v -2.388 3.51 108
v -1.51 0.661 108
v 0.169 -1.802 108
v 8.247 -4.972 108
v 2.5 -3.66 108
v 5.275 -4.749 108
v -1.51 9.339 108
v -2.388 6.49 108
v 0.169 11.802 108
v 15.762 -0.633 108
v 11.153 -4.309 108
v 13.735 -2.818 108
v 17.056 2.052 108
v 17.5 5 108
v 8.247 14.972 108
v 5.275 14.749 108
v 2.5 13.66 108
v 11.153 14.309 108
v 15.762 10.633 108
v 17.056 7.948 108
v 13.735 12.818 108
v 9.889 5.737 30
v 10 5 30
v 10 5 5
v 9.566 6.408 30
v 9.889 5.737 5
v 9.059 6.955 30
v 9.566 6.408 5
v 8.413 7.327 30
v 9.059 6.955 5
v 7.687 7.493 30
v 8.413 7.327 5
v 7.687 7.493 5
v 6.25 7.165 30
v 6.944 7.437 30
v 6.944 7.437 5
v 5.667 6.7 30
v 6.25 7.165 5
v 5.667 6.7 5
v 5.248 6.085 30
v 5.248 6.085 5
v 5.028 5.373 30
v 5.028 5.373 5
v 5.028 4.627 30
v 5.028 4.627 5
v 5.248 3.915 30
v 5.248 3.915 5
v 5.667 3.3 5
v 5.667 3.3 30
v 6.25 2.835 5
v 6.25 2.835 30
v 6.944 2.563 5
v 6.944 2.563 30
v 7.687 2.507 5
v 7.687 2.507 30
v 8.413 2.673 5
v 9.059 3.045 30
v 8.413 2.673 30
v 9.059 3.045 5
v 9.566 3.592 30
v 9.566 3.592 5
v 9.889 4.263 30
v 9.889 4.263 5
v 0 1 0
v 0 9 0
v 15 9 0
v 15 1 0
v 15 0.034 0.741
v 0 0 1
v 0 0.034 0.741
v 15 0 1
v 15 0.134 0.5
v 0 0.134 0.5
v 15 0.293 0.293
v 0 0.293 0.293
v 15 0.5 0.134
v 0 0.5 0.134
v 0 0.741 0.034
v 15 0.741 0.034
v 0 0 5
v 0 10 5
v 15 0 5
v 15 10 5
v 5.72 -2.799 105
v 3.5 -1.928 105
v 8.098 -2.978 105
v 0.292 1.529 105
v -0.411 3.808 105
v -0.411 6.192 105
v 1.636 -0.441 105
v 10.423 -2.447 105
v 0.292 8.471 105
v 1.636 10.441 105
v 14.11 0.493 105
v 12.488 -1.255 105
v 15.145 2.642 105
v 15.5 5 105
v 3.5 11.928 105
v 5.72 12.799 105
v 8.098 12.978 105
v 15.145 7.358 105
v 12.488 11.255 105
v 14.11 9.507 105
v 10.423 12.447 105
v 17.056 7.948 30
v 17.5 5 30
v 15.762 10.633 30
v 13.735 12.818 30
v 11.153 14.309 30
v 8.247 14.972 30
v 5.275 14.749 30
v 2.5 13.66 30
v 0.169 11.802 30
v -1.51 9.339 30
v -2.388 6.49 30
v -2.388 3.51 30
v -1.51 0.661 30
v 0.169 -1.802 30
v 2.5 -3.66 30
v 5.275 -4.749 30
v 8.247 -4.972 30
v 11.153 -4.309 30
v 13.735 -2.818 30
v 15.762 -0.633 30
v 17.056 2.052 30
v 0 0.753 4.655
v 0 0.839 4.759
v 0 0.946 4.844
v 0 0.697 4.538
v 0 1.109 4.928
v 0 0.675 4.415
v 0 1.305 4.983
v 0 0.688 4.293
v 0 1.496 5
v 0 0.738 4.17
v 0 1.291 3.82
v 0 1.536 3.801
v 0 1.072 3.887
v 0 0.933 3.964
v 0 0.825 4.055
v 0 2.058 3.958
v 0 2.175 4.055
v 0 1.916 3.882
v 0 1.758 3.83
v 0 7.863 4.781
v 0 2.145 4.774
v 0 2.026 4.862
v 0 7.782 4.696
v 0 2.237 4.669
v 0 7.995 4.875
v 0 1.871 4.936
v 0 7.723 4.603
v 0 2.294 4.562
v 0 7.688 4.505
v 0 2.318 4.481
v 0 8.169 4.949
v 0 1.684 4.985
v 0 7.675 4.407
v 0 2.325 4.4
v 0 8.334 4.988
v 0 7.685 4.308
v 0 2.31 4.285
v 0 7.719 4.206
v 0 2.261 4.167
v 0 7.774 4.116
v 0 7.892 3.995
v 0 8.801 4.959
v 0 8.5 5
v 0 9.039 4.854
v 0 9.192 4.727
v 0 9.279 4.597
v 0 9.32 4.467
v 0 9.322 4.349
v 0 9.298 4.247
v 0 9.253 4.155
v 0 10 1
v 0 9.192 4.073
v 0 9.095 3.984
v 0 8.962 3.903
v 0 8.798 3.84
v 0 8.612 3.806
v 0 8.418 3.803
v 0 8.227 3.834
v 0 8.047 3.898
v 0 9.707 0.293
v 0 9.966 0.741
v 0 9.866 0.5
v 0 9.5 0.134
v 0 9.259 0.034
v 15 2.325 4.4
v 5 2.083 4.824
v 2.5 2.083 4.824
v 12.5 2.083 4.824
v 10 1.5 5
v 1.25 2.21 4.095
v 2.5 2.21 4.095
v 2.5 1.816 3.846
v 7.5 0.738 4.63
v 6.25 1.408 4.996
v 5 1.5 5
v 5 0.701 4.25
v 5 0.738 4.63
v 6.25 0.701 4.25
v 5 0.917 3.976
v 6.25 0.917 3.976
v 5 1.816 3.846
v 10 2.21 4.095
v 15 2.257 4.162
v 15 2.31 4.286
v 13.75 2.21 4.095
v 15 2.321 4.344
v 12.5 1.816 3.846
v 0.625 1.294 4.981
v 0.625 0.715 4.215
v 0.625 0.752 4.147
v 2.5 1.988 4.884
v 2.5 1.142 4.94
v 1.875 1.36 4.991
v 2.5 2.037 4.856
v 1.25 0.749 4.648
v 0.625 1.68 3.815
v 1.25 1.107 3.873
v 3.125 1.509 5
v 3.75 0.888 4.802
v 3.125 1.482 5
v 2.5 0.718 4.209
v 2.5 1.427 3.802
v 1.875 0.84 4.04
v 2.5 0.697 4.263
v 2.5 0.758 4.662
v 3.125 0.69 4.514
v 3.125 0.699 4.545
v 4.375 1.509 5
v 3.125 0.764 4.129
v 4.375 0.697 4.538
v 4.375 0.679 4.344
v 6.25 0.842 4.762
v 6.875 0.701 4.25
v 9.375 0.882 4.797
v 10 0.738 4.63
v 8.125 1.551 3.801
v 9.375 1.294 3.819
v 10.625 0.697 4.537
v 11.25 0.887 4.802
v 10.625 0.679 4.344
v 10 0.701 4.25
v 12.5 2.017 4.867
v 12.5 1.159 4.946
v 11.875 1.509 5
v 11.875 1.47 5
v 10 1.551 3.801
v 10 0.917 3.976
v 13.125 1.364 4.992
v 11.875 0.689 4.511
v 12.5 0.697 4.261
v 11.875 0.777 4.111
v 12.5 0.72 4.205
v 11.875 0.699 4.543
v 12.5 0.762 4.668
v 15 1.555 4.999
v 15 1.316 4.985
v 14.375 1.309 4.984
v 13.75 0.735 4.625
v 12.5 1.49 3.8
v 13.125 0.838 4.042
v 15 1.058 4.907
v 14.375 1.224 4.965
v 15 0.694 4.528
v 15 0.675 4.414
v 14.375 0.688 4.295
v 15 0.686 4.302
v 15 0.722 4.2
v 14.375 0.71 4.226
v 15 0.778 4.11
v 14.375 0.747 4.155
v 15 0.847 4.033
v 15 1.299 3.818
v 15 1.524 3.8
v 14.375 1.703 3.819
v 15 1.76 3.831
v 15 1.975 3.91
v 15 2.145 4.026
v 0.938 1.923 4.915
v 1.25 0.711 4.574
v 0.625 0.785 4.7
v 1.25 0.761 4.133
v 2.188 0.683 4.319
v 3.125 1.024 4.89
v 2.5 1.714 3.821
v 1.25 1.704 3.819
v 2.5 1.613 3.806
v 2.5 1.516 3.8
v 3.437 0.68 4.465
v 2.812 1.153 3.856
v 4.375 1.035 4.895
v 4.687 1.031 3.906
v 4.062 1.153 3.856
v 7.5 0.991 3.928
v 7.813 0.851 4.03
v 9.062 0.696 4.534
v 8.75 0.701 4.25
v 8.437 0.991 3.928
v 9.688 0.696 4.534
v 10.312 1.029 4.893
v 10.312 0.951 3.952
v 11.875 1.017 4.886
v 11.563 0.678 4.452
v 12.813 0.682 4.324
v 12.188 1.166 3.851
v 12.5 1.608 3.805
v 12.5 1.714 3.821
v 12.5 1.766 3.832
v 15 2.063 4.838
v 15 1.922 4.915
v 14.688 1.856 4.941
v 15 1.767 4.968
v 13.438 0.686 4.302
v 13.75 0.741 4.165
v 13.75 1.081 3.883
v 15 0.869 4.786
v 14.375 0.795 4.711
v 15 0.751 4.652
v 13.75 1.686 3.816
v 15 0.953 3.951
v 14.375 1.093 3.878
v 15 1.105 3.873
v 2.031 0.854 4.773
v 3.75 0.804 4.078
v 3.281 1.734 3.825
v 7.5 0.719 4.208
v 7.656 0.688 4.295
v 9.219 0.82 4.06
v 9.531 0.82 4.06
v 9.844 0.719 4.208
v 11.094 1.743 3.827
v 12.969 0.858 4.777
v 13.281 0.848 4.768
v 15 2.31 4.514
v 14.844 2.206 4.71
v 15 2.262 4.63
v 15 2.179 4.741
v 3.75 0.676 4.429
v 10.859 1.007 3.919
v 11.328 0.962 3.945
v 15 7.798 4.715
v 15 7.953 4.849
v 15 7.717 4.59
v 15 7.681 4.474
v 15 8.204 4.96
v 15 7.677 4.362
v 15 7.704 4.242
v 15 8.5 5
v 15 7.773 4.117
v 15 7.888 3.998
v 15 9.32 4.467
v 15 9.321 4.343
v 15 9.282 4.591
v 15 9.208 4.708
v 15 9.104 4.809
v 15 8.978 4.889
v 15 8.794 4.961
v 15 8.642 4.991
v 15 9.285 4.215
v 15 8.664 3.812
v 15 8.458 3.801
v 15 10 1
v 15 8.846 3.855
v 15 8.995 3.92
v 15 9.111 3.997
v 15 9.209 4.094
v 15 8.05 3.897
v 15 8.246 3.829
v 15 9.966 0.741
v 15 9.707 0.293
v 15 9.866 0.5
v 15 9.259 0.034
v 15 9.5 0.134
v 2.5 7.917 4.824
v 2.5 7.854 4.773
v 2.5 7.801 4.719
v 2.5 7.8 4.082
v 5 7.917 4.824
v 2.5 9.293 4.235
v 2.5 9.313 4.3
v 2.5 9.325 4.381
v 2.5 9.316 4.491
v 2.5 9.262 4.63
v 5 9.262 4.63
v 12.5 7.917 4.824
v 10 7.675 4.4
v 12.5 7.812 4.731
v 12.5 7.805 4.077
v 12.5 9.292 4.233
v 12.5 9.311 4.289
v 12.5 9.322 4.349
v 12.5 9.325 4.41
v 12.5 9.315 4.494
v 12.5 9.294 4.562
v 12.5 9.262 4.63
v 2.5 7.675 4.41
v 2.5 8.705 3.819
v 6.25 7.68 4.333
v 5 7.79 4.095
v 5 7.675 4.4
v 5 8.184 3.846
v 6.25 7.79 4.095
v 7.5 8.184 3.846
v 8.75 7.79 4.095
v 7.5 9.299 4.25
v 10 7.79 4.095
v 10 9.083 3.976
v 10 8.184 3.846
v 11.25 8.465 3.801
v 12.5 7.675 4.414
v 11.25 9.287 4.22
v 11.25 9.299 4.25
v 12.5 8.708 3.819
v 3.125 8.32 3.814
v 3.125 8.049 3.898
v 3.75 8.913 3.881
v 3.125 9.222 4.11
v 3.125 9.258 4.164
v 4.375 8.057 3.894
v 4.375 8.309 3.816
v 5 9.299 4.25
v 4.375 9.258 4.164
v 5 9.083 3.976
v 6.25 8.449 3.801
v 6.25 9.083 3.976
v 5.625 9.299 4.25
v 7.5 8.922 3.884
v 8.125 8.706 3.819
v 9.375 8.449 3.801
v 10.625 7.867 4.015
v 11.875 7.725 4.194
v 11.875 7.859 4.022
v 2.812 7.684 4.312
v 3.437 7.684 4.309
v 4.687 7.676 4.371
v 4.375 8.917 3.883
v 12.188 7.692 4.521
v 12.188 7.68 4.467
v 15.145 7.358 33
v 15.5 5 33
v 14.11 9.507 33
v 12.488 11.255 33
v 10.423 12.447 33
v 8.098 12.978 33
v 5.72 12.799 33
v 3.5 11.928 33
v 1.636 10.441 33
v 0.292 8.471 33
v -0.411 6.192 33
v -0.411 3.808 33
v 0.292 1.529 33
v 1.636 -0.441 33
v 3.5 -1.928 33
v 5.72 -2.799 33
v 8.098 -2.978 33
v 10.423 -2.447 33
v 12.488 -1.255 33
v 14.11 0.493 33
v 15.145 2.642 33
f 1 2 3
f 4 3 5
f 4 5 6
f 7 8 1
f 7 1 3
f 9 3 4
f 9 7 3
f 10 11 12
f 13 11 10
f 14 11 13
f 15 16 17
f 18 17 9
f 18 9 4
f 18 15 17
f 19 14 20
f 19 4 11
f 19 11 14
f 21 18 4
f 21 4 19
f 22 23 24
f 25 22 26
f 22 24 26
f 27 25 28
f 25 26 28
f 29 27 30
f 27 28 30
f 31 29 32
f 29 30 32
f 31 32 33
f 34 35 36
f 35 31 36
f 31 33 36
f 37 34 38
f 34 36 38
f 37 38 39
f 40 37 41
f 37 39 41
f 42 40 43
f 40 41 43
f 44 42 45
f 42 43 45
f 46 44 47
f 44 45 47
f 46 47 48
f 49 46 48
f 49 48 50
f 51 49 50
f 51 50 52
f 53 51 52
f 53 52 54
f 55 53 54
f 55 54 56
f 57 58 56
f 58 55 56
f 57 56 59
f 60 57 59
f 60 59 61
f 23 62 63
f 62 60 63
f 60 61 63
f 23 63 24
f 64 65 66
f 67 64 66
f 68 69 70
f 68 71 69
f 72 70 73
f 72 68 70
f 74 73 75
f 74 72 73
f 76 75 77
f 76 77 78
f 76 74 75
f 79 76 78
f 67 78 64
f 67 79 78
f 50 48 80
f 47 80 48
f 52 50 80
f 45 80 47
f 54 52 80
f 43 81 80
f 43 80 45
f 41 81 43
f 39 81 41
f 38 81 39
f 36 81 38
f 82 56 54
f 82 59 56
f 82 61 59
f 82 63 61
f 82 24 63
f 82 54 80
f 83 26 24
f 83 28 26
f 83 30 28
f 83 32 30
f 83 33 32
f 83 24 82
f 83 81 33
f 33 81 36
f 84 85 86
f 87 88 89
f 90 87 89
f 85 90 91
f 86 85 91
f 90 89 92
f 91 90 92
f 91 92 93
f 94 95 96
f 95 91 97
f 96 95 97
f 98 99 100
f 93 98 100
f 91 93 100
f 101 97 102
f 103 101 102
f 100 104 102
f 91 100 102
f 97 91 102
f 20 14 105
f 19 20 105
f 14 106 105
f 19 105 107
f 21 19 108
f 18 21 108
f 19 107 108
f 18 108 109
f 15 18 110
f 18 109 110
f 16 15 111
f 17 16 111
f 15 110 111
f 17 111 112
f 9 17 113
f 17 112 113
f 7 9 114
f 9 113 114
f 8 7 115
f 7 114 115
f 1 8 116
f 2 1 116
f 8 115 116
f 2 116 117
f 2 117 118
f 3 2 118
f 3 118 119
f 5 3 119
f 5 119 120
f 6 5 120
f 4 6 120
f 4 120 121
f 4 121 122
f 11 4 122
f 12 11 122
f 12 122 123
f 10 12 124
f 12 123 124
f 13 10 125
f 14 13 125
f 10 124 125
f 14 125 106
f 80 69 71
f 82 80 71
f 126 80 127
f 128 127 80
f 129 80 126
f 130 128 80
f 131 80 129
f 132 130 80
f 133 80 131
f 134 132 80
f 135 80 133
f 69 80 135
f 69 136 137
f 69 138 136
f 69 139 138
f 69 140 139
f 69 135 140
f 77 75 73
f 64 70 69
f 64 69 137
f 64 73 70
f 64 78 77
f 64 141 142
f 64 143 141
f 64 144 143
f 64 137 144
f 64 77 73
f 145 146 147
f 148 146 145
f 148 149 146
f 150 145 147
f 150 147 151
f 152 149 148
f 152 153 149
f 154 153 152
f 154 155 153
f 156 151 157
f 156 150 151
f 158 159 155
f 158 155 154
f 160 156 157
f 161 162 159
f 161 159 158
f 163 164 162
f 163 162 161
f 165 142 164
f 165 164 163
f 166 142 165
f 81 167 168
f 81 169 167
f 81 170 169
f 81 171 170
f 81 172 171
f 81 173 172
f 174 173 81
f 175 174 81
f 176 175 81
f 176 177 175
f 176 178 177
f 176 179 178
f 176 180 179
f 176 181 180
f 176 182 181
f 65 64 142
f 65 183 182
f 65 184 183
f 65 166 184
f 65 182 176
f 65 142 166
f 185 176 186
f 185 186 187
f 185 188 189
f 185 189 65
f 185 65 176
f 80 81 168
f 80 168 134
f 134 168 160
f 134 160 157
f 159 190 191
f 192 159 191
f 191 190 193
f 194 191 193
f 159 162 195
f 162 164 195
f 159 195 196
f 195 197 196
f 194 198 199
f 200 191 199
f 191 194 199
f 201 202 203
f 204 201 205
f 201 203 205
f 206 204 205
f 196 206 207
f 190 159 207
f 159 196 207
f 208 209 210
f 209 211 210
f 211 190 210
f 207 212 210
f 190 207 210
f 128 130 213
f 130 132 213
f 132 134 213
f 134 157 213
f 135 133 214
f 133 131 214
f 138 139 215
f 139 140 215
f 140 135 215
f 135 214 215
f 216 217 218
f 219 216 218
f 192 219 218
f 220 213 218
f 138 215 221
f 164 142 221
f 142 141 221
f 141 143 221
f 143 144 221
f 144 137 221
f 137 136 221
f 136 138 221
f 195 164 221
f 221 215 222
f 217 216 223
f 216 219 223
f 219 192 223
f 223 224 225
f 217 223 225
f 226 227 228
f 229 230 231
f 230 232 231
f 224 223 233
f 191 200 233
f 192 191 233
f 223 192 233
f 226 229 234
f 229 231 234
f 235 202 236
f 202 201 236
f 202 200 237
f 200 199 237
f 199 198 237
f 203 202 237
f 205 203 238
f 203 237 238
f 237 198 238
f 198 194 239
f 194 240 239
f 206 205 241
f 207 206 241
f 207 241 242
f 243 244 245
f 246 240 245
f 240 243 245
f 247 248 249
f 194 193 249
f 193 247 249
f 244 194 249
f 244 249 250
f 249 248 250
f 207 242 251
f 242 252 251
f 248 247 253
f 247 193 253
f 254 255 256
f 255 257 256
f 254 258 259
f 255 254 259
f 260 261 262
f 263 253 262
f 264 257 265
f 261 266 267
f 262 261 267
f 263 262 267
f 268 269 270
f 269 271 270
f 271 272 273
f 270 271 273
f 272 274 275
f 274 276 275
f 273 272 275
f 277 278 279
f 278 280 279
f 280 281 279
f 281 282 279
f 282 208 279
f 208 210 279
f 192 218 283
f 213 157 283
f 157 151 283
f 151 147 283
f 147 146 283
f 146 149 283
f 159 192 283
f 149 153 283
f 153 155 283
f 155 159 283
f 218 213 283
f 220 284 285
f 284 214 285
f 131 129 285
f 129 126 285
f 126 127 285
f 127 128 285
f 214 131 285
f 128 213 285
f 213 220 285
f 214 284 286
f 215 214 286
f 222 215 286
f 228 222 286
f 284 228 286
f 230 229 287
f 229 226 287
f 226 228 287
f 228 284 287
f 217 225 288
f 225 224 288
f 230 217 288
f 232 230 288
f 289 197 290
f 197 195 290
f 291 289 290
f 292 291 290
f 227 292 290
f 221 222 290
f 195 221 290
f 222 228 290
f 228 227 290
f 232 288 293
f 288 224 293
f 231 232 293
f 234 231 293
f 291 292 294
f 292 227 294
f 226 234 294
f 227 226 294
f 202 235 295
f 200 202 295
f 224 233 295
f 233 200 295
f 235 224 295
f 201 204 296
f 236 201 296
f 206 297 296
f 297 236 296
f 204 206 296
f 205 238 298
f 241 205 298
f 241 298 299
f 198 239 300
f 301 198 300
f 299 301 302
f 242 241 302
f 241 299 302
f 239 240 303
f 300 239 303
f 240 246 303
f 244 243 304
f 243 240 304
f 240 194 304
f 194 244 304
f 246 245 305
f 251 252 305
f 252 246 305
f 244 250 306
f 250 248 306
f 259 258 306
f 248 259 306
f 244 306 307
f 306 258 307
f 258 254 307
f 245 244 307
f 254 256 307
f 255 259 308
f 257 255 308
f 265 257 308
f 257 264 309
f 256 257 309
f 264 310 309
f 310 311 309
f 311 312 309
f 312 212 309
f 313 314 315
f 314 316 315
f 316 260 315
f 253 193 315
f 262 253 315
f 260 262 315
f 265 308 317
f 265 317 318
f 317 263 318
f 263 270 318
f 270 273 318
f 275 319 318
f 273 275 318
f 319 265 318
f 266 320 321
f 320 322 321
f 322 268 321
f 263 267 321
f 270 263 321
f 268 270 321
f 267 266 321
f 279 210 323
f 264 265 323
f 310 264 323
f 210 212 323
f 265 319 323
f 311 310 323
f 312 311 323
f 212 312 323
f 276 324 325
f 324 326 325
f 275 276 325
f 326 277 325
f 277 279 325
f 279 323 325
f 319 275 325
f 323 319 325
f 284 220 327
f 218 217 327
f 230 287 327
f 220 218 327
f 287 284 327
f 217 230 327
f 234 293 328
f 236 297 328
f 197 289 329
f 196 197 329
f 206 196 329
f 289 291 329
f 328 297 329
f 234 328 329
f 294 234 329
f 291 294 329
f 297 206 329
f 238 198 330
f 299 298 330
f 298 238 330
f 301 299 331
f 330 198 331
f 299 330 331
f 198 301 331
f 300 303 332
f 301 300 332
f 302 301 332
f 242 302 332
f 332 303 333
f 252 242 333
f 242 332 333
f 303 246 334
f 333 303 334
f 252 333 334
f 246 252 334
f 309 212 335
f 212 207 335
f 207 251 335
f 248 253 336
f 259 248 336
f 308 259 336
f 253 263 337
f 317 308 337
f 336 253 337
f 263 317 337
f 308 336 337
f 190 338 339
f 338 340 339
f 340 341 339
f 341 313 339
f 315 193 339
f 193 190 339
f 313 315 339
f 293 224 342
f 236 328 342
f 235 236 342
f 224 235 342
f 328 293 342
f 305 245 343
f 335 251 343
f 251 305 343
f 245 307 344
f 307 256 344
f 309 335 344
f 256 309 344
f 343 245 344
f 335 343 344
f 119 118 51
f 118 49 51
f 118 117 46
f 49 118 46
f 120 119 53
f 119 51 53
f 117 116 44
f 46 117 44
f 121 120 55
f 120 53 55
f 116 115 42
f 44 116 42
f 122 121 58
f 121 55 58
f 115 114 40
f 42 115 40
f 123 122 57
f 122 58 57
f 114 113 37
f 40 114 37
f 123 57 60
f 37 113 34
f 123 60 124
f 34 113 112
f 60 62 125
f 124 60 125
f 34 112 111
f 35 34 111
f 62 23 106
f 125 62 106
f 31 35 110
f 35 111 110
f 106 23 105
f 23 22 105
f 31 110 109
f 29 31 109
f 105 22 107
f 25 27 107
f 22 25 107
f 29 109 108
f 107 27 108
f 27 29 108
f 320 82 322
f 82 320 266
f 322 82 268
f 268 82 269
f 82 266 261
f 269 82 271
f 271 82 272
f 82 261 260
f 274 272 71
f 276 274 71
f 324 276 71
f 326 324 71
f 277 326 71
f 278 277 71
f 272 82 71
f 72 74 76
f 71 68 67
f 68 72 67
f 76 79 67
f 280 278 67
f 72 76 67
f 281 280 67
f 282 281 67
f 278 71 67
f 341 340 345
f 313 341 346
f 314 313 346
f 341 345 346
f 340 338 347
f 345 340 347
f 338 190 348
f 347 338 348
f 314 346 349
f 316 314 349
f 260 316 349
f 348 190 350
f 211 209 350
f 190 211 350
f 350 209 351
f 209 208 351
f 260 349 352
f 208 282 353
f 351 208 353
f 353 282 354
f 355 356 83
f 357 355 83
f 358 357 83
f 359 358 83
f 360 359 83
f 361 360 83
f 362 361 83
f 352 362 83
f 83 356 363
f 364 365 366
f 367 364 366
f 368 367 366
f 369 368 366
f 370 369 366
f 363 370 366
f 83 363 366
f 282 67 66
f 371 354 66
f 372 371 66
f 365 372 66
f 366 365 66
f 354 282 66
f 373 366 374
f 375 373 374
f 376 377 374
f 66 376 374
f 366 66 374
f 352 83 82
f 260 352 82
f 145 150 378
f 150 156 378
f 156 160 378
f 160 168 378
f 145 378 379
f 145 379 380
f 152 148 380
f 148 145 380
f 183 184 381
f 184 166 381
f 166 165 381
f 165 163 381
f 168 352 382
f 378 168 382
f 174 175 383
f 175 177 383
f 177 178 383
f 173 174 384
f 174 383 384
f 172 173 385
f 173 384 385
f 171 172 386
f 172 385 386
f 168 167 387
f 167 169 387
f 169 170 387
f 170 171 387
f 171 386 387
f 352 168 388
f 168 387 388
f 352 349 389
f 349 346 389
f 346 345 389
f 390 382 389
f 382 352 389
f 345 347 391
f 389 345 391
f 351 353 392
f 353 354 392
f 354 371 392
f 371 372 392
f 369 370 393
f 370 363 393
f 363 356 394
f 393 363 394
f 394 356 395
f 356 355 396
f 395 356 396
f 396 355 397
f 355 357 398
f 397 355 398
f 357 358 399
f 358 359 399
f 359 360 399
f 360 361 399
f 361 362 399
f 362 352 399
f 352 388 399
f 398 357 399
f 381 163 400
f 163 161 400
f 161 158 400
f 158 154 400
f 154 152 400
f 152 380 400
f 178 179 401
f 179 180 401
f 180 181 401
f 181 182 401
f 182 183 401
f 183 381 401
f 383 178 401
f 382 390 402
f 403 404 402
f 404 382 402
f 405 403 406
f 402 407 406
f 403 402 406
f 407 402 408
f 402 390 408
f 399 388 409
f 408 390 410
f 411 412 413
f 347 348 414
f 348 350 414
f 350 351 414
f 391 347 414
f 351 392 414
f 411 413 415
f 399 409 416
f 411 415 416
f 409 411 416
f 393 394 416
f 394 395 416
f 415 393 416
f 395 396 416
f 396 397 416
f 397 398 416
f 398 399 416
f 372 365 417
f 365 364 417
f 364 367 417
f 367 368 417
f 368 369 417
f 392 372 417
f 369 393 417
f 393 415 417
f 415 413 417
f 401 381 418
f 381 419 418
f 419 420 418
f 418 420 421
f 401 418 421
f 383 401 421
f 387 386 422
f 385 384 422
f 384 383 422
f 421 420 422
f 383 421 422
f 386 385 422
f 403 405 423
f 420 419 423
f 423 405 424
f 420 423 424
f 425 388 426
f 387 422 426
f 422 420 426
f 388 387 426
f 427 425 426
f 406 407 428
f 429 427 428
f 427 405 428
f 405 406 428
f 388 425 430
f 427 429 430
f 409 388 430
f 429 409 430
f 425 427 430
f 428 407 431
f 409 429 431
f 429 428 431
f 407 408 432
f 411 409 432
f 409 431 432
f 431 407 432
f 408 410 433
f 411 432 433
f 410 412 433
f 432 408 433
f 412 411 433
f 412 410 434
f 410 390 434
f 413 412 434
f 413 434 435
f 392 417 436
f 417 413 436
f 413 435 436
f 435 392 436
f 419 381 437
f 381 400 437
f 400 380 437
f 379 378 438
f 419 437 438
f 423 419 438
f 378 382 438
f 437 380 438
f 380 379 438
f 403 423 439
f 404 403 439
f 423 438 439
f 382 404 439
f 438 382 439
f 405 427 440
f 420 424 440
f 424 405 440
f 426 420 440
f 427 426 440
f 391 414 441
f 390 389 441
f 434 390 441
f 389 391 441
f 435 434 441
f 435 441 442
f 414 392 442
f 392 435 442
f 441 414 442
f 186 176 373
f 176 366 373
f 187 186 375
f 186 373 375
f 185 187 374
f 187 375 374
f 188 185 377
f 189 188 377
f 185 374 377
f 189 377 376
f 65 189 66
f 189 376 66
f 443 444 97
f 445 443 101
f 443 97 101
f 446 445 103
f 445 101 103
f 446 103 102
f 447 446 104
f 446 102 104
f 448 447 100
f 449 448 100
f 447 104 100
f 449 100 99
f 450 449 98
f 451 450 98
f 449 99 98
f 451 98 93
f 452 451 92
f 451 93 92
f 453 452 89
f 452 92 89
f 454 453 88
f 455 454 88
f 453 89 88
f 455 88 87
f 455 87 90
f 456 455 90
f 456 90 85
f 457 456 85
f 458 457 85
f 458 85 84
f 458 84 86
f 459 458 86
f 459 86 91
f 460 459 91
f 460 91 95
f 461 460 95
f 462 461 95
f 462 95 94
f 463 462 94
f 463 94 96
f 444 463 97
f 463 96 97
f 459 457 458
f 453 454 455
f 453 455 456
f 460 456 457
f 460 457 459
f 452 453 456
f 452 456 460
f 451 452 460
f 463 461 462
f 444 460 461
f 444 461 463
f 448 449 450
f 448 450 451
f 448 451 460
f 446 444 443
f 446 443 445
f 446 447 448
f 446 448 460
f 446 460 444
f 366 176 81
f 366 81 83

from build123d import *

# Parameters (mm, degrees)
F0_W      = 15
F0_H      = 10
F1_DEPTH  = 5
F2_R      = 2.5
F3_DEPTH  = 100
F6_R      = 1
F9_DEPTH  = 15.001
F5_R      = 10
F10_DEPTH = 75
F11_R     = 8
F12_DEPTH = 72
F13_R     = 10
F13_R_2   = 8
F15_DEPTH = 3


with BuildPart() as f1:
    # F0 (on Top) → F1 (new body)
    with BuildSketch(Plane.XY):
        with Locations((7.5, 5)):
            Rectangle(F0_W, F0_H)
    extrude(amount=F1_DEPTH)

    # F2 (on face) → F3 (join)
    with BuildSketch(Plane.XY.offset(5)):
        with Locations((7.5, 5)):
            Circle(F2_R)
    extrude(amount=F3_DEPTH)

    # F6
    f6_edges = [f1.edges().sort_by_distance(p)[0] for p in [
        (7.5, 0, 0),
        (7.5, 10, 0),
    ]]
    fillet(f6_edges, radius=F6_R)

    # F7 (on face) → F9 (cut, through all)
    with BuildSketch(Plane.YZ.offset(15)):
        with BuildLine():
            add(Edge.make_bspline(
                [(1.5, 4.9999053105), (-0.491726189, 4.9999053105), (0.9166369055, 3.9758028869), (2.325, 2.9517004633), (2.325, 4.4)],
                knots=[1.5707963268, 1.5707963268, 1.5707963268, 3.926990817, 3.926990817, 6.2831853072, 6.2831853072, 6.2831853072], degree=2, weights=[1, 0.3826834324, 1, 0.3826834324, 1]))
            add(Edge.make_bspline(
                [(2.325, 4.4), (2.325, 4.9999053105), (1.5, 4.9999053105)],
                knots=[0, 0, 0, 1.5707963268, 1.5707963268, 1.5707963268], degree=2, weights=[1, 0.7071067812, 1]))
        make_face()
        with BuildLine():
            add(Edge.make_bspline(
                [(7.675, 4.4), (7.675, 2.9517004633), (9.0833630945, 3.9758028869), (10.491726189, 4.9999053105), (8.5, 4.9999053105)],
                knots=[0, 0, 0, 2.3561944902, 2.3561944902, 4.7123889804, 4.7123889804, 4.7123889804], degree=2, weights=[1, 0.3826834324, 1, 0.3826834324, 1]))
            add(Edge.make_bspline(
                [(8.5, 4.9999053105), (7.675, 4.9999053105), (7.675, 4.4)],
                knots=[4.7123889804, 4.7123889804, 4.7123889804, 6.2831853072, 6.2831853072, 6.2831853072], degree=2, weights=[1, 0.7071067812, 1]))
        make_face()
    extrude(amount=-F9_DEPTH, mode=Mode.SUBTRACT)

    # F5 (on offset) → F10 (join, through all)
    with BuildSketch(Plane.XY.offset(30)):
        with Locations((7.5, 5)):
            Circle(F5_R)
    extrude(amount=F10_DEPTH)

    # F11 (on face) → F12 (cut)
    with BuildSketch(Plane.XY.offset(105)):
        with Locations((7.5, 5)):
            Circle(F11_R)
    extrude(amount=-F12_DEPTH, mode=Mode.SUBTRACT)

    # F13 (on face) → F15 (join)
    with BuildSketch(Plane.XY.offset(105)):
        with Locations((7.5, 5)):
            Circle(F13_R)
        with Locations((7.5, 5)):
            Circle(F13_R_2, mode=Mode.SUBTRACT)
        with Locations((7.5, 5)):
            Circle(F13_R_2)
    extrude(amount=F15_DEPTH)


solid = f1.part
